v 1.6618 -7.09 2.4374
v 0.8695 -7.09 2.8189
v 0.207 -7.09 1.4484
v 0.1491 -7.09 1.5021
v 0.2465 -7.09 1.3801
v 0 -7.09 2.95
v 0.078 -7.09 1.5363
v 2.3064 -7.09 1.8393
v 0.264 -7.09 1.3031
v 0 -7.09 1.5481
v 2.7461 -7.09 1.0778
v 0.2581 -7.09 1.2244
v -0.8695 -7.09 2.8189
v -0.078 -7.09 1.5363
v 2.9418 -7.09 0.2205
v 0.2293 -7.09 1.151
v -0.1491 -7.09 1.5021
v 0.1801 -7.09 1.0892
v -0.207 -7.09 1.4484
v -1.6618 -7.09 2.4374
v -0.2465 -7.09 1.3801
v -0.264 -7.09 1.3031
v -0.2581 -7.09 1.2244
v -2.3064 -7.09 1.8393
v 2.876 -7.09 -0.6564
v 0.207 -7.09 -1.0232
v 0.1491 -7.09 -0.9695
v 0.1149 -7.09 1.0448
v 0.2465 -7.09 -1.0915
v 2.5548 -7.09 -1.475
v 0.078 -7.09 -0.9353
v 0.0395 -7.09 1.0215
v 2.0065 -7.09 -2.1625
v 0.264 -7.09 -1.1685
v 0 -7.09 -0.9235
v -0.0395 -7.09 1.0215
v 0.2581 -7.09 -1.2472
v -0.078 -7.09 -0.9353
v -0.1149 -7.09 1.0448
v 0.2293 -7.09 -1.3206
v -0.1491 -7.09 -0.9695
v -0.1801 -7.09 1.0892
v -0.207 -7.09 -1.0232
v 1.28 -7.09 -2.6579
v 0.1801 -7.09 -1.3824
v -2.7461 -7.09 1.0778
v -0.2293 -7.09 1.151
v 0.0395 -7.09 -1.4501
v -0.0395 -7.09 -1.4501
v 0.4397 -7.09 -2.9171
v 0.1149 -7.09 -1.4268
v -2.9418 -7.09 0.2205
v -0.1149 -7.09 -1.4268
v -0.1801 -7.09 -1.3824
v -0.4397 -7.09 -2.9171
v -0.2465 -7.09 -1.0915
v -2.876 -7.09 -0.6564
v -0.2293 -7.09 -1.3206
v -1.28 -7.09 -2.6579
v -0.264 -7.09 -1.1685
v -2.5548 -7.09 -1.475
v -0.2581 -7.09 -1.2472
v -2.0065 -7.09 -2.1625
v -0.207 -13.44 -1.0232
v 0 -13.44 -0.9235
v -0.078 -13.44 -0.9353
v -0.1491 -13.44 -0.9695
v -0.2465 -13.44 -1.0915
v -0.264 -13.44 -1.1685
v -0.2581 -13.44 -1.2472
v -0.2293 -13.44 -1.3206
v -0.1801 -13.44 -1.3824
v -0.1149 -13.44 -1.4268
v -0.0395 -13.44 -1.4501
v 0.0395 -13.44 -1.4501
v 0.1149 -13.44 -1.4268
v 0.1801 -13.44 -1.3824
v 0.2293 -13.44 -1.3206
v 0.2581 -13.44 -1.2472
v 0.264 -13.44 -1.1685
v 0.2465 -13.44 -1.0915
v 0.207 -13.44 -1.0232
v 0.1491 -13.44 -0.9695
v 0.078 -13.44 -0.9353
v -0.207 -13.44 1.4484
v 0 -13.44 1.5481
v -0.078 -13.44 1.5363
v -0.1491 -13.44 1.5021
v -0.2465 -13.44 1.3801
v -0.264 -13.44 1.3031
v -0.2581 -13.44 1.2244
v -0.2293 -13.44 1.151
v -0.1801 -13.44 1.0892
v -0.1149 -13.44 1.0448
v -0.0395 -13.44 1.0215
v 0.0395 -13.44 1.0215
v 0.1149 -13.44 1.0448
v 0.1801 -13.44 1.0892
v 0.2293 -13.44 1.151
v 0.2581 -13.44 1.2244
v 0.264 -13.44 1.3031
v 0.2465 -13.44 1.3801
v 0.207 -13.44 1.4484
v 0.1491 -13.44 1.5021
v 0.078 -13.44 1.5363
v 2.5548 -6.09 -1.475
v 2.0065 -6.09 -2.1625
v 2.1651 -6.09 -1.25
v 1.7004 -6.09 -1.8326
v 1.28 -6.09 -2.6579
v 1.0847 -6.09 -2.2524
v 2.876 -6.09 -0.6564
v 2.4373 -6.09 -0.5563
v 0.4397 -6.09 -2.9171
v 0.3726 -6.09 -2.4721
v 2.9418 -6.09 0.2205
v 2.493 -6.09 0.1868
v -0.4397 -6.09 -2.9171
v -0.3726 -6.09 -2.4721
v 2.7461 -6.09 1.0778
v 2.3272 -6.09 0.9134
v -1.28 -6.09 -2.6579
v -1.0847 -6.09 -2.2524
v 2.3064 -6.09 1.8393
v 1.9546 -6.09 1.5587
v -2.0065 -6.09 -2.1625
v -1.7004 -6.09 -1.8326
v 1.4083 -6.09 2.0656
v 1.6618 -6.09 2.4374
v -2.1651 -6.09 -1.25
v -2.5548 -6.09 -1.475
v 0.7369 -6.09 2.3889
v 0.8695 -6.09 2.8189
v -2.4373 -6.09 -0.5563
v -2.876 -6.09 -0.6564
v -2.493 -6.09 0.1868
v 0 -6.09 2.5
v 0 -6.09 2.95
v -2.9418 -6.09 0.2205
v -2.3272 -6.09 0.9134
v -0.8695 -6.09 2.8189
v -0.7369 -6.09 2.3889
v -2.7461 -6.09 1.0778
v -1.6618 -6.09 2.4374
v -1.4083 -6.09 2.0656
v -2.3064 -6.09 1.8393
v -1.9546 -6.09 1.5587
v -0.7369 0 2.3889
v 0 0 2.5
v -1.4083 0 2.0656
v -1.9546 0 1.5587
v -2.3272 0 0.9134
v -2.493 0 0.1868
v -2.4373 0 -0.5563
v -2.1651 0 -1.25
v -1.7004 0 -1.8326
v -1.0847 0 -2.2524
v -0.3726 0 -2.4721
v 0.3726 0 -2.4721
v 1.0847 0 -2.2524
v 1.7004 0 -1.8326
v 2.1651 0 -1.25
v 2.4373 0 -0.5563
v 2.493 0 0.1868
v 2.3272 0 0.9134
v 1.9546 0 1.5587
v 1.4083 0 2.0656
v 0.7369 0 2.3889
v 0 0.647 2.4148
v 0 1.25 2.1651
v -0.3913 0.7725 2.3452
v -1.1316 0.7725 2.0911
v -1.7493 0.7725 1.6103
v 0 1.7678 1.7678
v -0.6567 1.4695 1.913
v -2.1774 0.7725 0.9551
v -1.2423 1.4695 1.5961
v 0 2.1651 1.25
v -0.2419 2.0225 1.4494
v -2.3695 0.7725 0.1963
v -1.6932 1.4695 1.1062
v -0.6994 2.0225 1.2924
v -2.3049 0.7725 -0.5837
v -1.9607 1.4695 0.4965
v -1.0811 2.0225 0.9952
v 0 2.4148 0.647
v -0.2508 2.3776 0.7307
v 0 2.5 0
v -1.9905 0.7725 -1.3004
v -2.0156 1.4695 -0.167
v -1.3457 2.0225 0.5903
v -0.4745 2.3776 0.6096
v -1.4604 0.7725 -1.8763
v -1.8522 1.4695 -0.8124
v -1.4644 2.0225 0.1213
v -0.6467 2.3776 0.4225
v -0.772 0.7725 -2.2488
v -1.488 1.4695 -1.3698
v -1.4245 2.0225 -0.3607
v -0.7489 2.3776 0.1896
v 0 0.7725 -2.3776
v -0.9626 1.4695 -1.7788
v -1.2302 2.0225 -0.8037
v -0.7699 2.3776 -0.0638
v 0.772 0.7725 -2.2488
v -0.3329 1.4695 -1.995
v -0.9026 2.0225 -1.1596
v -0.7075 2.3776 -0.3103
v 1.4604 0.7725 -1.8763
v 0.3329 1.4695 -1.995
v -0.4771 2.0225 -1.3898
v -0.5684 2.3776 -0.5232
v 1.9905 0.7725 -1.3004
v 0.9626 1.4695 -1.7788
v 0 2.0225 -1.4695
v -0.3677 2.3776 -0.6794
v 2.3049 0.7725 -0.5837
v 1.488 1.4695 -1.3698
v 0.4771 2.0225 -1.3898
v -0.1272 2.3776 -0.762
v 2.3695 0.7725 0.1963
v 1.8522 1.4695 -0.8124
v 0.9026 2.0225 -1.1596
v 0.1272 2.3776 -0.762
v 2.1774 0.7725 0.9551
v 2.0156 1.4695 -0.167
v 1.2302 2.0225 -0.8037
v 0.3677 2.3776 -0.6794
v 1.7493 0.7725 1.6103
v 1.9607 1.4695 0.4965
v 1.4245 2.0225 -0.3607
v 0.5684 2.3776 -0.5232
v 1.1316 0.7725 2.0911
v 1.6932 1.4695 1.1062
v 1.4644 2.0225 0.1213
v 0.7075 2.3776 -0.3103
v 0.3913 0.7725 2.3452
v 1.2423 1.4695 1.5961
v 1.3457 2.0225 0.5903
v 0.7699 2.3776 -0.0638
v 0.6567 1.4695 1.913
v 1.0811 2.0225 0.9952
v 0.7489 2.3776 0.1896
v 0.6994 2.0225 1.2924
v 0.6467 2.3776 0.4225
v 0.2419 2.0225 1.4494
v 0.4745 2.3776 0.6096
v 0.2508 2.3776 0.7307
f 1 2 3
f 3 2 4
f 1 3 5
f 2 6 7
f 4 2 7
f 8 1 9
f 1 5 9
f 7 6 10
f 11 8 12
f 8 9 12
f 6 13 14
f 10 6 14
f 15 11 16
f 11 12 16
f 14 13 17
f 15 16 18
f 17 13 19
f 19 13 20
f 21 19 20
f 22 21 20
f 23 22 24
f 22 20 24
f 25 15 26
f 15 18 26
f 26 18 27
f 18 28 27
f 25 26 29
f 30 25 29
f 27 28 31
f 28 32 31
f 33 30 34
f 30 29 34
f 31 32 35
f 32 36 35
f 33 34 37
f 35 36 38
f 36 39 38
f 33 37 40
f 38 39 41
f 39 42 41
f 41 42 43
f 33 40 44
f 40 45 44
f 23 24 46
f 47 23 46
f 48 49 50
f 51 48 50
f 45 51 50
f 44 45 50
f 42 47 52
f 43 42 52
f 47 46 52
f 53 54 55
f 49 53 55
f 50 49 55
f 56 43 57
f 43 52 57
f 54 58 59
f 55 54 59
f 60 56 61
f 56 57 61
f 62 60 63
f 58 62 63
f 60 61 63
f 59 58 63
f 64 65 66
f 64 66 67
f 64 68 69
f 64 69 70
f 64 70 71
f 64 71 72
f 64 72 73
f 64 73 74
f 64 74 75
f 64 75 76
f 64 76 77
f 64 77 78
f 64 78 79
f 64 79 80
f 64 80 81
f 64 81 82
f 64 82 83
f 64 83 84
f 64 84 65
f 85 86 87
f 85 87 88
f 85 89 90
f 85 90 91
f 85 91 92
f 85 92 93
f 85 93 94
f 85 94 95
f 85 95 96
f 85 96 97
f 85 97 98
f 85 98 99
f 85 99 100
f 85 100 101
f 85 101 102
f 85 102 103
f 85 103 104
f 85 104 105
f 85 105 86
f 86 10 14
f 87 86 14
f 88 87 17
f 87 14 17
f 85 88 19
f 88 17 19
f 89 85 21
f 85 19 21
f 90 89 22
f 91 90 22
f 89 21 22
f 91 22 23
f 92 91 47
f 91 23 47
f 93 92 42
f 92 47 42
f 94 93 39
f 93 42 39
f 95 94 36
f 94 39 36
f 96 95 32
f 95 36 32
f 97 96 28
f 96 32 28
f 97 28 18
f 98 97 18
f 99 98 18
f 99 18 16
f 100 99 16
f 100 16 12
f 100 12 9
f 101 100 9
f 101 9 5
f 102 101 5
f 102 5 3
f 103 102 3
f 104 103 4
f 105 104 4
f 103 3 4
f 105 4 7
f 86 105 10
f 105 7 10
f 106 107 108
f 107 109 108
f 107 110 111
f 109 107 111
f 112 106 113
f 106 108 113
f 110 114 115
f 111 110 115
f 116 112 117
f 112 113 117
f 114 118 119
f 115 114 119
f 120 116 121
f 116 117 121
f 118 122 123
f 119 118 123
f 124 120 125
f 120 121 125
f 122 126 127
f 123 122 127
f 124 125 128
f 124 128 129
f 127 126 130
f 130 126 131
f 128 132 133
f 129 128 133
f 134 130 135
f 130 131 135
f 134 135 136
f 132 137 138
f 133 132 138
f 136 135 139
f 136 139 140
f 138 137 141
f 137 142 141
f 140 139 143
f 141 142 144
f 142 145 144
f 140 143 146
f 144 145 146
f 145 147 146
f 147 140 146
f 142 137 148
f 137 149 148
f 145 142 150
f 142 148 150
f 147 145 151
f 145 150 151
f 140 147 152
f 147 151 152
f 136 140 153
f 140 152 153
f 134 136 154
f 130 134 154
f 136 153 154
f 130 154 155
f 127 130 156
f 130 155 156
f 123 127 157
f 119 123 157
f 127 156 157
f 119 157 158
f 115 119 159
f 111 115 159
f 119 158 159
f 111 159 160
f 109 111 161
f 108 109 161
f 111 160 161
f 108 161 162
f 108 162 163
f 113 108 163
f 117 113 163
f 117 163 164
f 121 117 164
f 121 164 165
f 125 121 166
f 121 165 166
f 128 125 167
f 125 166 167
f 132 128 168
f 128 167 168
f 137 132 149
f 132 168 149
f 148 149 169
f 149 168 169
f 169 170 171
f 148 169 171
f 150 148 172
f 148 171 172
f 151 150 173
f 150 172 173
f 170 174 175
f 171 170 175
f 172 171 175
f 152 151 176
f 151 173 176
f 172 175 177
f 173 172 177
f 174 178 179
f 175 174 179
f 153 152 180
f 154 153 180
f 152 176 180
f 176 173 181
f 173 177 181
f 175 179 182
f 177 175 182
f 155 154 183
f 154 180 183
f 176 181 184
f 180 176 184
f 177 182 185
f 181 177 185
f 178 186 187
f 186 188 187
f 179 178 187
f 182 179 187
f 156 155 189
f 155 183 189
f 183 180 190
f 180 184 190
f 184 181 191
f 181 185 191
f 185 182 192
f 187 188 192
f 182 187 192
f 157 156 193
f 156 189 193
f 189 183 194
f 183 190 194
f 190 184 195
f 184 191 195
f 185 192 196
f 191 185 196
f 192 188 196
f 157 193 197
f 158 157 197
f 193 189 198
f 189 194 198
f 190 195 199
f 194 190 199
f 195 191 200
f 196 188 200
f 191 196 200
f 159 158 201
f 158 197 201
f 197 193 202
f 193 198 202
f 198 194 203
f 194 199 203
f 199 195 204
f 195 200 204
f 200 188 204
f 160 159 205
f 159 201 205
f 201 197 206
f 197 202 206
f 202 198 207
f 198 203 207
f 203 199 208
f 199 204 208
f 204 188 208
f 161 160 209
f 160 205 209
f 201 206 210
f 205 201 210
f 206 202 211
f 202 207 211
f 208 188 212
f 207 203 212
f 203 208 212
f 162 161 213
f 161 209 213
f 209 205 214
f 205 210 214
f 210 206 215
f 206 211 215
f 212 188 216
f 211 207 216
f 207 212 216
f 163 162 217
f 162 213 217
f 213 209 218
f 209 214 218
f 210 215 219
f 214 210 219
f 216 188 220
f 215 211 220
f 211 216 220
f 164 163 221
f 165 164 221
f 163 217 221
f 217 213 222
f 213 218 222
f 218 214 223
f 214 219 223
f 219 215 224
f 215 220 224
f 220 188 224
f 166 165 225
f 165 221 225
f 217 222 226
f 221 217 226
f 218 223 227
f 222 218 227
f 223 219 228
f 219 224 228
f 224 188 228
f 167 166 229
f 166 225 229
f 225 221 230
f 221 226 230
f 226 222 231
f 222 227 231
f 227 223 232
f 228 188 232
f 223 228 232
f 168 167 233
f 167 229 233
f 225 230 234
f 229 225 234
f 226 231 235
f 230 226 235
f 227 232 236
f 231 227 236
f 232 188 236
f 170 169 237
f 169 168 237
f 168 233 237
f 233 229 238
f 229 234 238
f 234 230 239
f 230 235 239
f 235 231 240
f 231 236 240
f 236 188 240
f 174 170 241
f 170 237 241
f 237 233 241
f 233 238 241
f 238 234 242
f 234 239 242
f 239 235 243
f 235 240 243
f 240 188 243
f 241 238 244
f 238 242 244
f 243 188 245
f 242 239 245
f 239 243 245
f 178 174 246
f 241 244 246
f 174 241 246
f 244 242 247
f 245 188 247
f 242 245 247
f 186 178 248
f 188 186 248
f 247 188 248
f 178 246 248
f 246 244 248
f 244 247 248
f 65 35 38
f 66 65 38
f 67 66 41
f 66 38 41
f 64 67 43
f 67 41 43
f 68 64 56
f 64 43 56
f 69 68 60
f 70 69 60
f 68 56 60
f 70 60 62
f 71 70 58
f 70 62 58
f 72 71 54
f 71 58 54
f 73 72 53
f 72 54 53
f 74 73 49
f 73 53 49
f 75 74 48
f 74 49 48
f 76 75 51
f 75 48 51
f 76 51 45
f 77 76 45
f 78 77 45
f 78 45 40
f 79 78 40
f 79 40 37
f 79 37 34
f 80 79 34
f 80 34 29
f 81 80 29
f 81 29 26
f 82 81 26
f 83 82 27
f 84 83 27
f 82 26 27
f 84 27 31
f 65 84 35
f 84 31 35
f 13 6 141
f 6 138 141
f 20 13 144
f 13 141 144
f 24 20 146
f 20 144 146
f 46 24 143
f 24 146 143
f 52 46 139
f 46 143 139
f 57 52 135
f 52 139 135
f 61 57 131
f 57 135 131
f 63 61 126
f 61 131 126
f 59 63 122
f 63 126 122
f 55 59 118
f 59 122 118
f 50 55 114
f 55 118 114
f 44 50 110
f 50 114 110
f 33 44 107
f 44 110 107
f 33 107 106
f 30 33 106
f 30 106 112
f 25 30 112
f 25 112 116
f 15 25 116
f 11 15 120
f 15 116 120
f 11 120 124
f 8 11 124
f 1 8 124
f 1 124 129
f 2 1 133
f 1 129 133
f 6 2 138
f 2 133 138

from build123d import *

# Parameters (mm, degrees)
SKETCH2_R           = 0.26475865
BOSS_EXTRUDE1_DEPTH = 6.35


with BuildPart() as part:
    # Sketch1 → Revolve6 (revolve)
    with BuildSketch(Plane(origin=(0, 0, 0), x_dir=(0, 0, -1), z_dir=(1, 0, 0)), mode=Mode.PRIVATE) as revolve6_sk:
        with BuildLine():
            ThreePointArc((2.5, 0), (1.767766953, 1.767766953), (0, 2.5))
            Line((0, 2.5), (0, -7.09))
            Line((0, -7.09), (2.95, -7.09))
            Line((2.95, -7.09), (2.95, -6.09))
            Line((2.95, -6.09), (2.5, -6.09))
            Line((2.5, -6.09), (2.5, 0))
        make_face()
    revolve(revolve6_sk.sketch.rotate(Axis((0, 2.5, 0), (0, -1, 0)), 180), axis=Axis((0, 2.5, 0), (0, -1, 0)))

    # Sketch2 → Boss-Extrude1 (add)
    with BuildSketch(Plane.XZ.offset(7.09)):
        with Locations(Location((0, 1.283330706, 0), (0, 0, 90))):
            Circle(SKETCH2_R)
        with Locations(Location((0, -1.188269173, 0), (0, 0, 90))):
            Circle(SKETCH2_R)
    extrude(amount=BOSS_EXTRUDE1_DEPTH)


solid = part.part
